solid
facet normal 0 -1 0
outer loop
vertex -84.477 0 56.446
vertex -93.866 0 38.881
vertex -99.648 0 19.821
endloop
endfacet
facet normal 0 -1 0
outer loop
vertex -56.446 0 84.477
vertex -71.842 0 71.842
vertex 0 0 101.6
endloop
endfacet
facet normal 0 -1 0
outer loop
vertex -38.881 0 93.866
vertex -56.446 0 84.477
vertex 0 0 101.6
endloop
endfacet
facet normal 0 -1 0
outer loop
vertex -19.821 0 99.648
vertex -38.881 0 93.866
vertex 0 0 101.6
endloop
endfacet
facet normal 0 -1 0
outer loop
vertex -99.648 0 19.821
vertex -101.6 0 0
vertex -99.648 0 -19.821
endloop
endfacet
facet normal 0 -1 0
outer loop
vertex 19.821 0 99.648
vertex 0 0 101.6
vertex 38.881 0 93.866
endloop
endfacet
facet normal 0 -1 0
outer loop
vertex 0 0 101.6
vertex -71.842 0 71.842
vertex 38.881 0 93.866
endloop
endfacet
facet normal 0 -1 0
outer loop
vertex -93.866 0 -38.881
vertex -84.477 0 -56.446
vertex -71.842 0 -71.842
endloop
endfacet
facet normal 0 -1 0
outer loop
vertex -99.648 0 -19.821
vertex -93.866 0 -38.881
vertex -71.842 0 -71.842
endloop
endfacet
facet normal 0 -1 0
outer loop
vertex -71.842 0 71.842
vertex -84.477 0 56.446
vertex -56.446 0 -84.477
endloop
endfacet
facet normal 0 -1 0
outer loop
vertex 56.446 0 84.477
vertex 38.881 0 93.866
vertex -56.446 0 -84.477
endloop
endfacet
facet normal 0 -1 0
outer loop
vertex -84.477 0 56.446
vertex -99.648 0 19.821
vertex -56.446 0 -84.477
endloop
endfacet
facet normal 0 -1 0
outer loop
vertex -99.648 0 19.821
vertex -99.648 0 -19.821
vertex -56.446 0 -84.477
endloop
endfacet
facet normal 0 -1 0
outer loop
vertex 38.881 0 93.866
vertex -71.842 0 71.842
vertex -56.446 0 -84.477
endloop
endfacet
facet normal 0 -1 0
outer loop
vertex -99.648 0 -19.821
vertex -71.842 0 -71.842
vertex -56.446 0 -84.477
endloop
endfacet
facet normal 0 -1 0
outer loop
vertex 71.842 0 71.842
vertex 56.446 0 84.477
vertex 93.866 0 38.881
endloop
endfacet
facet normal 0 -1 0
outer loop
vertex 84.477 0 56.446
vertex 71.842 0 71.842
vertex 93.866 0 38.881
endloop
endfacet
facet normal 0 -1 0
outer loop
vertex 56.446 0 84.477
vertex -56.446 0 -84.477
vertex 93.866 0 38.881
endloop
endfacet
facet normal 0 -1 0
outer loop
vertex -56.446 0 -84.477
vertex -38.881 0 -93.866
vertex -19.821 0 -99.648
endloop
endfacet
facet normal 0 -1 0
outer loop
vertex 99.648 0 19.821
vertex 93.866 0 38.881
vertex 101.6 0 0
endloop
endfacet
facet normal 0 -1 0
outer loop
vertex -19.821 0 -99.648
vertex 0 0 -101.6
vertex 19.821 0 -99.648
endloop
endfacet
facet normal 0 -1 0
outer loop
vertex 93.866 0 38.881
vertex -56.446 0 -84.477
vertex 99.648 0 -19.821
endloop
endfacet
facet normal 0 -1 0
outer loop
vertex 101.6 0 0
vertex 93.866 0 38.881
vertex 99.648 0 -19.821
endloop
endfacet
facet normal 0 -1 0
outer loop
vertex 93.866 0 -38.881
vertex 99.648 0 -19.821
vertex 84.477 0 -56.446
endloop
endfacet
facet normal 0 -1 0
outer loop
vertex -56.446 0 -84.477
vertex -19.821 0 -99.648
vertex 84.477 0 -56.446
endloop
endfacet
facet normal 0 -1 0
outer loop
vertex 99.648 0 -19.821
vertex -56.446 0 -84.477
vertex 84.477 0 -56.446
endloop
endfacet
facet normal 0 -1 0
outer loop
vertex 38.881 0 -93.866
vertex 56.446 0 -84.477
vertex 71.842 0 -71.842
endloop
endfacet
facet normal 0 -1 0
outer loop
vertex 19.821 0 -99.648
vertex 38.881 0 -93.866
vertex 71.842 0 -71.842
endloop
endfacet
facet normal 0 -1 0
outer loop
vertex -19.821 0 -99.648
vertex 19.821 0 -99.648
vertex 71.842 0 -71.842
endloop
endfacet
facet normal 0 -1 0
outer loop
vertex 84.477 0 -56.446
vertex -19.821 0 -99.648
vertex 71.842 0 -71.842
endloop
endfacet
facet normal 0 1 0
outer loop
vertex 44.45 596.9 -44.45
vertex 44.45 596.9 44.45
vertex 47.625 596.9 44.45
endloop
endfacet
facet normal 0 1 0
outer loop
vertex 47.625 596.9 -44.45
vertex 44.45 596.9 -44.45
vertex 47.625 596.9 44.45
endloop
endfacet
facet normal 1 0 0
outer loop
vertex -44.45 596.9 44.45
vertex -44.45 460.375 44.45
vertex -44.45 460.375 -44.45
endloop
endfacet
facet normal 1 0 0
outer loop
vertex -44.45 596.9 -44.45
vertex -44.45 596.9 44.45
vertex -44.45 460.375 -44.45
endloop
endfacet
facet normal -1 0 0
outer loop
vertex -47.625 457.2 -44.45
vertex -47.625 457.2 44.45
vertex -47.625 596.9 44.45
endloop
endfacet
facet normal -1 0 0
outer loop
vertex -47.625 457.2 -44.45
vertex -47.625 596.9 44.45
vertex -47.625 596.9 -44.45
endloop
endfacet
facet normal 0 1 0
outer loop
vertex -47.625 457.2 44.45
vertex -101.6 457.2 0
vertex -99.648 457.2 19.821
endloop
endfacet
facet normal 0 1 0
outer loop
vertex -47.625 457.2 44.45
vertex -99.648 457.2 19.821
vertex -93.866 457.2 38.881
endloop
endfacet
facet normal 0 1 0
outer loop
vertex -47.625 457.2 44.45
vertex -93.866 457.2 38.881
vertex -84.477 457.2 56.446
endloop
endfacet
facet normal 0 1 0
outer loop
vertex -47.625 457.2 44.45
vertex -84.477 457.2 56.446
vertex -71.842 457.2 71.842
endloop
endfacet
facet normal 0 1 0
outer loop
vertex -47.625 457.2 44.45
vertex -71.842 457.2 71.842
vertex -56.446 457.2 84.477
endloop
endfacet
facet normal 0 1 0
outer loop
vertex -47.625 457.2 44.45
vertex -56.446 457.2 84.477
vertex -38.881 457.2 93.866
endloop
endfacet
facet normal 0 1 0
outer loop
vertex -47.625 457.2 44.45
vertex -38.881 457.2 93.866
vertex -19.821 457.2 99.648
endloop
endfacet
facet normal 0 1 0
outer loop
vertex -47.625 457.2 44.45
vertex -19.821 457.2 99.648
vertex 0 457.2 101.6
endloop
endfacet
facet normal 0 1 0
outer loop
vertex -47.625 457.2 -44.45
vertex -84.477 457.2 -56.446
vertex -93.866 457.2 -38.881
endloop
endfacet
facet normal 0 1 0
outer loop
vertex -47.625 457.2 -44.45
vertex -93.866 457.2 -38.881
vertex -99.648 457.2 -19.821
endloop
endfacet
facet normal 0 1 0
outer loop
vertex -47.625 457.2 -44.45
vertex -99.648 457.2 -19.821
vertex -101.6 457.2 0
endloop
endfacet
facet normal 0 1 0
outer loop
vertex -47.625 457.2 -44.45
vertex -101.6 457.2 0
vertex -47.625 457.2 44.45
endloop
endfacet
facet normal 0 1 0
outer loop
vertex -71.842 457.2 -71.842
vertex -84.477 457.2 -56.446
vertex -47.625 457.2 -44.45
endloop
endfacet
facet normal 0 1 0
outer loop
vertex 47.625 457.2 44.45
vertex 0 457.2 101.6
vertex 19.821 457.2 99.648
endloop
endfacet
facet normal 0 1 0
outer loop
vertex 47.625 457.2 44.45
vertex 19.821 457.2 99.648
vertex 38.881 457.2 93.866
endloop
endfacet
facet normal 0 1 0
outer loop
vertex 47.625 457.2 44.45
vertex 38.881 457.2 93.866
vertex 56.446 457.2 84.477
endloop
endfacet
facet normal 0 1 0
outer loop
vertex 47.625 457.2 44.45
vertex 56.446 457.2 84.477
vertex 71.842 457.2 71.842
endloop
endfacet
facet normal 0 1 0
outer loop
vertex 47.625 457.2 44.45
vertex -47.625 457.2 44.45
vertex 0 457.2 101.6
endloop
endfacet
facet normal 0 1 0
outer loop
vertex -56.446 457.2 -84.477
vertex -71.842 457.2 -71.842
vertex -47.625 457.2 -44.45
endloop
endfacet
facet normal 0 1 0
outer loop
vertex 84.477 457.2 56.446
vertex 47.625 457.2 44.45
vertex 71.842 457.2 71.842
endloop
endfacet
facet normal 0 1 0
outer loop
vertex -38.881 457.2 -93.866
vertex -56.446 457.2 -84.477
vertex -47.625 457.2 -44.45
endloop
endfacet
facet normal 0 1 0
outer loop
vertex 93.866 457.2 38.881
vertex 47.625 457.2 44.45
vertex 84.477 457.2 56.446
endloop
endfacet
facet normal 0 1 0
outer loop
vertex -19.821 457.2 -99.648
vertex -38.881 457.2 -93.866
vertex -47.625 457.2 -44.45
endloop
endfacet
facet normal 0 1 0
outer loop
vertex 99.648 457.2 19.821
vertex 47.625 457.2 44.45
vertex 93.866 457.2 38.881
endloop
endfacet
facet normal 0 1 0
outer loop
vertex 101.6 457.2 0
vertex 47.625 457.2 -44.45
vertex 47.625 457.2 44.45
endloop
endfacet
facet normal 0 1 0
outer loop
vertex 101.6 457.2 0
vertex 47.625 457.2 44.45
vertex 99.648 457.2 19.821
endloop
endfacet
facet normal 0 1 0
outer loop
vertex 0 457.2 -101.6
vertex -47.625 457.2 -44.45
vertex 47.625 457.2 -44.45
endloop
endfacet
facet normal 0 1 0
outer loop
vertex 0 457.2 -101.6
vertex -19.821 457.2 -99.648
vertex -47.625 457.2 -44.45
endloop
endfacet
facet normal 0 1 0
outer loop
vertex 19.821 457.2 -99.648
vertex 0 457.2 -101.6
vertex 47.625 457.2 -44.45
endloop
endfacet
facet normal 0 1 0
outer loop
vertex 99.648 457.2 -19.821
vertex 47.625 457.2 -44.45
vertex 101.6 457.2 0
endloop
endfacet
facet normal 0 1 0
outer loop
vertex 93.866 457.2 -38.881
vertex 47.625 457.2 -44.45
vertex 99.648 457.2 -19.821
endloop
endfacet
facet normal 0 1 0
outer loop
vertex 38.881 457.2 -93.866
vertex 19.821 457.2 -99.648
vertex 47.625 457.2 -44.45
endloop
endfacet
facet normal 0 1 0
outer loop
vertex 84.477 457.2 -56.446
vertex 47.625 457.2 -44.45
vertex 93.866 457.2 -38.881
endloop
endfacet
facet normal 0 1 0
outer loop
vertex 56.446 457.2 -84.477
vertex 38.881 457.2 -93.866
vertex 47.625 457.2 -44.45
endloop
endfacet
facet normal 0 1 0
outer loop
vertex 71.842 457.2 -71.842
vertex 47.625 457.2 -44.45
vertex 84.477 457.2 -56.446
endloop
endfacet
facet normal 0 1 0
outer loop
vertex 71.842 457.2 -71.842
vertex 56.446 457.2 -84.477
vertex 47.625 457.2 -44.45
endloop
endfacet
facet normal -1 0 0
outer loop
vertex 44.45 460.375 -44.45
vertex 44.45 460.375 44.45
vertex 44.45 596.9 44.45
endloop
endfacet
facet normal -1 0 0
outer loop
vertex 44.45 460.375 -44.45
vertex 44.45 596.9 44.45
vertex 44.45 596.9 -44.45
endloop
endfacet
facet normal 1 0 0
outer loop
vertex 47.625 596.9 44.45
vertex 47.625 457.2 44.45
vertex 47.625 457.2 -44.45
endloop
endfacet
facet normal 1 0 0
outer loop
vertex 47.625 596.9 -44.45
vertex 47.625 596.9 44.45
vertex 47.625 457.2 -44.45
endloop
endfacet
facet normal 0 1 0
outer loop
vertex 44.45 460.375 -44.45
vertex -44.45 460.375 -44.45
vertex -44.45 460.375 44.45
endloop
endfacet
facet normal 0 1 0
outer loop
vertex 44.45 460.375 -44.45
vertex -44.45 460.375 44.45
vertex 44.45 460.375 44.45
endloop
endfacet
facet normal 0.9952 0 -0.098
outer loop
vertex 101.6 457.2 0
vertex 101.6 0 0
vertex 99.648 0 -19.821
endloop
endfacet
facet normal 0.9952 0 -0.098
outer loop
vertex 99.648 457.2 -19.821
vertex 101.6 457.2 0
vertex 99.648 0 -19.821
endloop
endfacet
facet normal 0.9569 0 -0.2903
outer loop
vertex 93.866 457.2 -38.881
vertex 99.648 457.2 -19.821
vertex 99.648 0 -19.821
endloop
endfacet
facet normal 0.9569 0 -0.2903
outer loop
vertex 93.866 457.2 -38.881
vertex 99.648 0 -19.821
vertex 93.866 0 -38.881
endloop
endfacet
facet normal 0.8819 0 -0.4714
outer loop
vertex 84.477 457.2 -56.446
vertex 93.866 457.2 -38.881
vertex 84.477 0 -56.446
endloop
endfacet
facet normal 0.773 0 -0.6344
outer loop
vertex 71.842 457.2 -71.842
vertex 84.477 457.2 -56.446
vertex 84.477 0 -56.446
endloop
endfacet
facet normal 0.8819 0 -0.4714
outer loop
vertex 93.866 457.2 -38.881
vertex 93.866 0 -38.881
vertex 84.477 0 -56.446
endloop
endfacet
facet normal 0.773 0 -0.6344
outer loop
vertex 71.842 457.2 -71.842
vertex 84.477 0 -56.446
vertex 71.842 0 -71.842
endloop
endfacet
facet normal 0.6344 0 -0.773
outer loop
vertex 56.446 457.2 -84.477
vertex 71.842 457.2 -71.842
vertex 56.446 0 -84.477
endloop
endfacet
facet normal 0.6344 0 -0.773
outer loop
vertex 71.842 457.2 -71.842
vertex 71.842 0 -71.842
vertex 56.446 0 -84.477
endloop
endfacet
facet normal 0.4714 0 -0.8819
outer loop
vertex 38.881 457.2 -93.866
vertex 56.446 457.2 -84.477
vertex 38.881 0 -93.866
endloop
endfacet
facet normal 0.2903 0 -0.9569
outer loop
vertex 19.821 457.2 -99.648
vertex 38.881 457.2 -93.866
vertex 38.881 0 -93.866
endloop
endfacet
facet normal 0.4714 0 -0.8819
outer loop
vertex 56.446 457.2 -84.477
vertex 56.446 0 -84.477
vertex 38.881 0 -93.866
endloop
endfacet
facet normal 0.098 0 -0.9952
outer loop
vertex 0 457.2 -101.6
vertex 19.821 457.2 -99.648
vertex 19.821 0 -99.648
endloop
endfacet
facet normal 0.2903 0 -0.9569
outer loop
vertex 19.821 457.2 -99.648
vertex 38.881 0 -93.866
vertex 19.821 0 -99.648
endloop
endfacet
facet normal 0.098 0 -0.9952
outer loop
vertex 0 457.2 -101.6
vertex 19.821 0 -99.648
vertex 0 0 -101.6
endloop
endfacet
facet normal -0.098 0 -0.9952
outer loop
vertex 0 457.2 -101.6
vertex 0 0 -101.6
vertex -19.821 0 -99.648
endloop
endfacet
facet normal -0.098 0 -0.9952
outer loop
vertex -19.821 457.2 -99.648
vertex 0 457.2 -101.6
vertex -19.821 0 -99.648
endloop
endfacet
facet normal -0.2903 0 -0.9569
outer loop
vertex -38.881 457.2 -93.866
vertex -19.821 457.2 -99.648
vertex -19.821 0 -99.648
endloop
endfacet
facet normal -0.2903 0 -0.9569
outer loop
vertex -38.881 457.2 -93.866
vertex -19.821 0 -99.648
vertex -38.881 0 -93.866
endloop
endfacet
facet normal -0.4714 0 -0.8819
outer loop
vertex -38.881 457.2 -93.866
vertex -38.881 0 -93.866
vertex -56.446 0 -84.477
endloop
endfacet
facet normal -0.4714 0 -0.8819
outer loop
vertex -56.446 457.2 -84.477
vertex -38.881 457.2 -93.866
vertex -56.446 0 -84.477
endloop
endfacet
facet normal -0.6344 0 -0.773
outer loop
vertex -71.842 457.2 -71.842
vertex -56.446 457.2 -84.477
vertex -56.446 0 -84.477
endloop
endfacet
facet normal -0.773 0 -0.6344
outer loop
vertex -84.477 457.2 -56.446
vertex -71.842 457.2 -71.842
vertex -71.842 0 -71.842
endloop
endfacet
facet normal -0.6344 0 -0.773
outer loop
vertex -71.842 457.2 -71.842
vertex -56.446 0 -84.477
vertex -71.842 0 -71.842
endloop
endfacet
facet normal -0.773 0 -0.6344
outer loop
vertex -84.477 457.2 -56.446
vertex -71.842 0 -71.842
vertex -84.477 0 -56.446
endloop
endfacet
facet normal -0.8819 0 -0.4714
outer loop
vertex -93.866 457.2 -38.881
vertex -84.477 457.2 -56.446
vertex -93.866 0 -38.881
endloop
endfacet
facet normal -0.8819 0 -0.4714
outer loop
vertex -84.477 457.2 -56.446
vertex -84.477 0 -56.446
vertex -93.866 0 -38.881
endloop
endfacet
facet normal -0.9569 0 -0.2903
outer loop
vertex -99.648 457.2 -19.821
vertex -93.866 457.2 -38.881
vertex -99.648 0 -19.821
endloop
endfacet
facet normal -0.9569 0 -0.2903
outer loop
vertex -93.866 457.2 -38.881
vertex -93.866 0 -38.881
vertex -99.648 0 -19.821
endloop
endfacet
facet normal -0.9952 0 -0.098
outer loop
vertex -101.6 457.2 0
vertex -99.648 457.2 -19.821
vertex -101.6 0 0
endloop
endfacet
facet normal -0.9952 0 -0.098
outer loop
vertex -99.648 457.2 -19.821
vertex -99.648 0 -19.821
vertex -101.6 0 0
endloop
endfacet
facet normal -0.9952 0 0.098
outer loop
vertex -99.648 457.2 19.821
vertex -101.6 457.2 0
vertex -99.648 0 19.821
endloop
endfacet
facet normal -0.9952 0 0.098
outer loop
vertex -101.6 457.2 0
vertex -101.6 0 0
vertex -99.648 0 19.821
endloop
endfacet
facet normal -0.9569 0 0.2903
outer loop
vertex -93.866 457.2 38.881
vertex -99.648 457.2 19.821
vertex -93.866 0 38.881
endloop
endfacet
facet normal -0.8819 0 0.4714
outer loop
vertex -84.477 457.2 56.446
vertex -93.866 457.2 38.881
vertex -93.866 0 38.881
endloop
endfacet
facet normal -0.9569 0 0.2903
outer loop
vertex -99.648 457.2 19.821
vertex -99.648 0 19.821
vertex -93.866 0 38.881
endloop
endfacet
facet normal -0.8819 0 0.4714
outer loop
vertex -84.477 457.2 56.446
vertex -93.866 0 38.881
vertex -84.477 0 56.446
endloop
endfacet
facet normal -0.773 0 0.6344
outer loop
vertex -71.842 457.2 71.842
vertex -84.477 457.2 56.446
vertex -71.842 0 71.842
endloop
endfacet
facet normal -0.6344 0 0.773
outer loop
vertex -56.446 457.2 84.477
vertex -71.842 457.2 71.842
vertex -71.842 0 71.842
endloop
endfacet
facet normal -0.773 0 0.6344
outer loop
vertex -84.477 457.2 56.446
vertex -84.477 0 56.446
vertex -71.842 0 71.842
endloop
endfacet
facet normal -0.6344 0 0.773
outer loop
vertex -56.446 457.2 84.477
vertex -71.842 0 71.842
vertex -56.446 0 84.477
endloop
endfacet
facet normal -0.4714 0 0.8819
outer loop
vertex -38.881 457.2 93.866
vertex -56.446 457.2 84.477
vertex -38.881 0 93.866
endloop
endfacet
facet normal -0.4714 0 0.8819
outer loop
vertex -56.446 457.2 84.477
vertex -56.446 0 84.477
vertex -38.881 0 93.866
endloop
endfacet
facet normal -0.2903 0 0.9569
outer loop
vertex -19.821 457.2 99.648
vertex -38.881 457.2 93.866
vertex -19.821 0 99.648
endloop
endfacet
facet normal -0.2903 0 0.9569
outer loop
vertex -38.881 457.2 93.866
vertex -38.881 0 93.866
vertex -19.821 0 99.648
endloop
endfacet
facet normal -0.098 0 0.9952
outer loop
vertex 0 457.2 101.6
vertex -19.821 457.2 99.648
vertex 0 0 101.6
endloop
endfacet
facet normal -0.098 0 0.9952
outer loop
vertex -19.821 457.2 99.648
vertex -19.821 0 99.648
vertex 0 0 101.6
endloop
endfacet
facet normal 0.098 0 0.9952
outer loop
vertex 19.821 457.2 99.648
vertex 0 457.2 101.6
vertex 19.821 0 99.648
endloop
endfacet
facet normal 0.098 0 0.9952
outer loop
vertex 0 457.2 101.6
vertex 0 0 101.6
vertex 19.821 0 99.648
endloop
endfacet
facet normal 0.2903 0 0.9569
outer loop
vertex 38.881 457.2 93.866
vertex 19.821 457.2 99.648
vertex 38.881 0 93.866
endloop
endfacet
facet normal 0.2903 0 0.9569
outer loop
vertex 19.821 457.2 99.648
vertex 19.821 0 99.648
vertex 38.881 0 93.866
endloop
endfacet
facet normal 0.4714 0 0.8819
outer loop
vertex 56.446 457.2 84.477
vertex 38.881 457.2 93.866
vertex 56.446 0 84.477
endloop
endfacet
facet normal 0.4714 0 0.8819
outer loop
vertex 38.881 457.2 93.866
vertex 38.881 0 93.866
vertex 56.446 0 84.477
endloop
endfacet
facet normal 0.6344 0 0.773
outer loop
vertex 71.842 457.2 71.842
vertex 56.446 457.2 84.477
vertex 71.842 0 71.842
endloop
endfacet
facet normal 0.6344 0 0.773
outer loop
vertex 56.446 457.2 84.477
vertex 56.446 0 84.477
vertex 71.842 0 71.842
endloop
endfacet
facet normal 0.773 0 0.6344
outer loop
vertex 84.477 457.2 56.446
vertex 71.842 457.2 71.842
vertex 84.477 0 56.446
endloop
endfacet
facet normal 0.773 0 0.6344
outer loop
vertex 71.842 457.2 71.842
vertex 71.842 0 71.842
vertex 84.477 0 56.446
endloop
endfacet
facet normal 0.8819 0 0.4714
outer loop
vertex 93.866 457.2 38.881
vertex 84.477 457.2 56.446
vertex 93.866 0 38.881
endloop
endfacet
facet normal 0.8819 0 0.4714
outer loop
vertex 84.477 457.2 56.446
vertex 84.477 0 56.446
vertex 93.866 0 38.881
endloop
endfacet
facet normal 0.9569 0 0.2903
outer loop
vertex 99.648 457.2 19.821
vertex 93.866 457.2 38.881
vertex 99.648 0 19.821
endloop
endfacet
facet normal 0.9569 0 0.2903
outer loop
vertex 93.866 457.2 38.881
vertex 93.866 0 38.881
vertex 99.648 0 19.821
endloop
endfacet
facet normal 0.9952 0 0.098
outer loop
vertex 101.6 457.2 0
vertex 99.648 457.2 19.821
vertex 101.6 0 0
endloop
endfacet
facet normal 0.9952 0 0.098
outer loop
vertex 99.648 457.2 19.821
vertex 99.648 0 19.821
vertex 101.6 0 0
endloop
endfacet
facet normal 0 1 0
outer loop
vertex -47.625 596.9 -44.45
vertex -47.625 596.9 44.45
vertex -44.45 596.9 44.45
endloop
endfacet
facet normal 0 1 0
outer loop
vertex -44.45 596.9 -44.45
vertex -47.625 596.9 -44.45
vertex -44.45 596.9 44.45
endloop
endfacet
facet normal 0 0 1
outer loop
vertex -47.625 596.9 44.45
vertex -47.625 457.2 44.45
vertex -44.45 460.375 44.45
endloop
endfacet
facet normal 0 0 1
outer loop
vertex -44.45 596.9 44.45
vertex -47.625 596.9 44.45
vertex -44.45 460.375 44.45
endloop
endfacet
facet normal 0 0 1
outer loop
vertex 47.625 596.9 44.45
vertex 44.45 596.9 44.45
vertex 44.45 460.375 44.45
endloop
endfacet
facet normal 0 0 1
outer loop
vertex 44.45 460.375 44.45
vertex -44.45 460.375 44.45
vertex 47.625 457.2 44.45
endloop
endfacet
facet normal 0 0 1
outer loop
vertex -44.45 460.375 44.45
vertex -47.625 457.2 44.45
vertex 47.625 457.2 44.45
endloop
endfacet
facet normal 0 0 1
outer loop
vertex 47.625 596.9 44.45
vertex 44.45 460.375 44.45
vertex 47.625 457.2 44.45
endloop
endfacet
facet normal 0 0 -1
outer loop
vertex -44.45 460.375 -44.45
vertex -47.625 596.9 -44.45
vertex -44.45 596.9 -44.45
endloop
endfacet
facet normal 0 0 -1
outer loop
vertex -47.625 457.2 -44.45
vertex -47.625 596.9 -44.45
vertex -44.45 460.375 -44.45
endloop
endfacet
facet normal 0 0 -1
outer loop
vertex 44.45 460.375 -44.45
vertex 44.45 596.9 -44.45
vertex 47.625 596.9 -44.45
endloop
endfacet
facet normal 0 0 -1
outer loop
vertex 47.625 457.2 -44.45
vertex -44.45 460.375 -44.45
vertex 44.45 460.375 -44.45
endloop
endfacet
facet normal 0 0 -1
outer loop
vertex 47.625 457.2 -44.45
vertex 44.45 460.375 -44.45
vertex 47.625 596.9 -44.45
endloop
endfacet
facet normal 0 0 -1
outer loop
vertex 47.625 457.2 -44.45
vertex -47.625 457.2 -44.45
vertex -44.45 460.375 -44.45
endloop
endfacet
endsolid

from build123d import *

# Parameters (mm, degrees)
SKETCH1_R           = 101.6
BOSS_EXTRUDE1_DEPTH = 457.2
SKETCH2_W           = 3.175
SKETCH2_H           = 88.9
BOSS_EXTRUDE3_DEPTH = 139.7
SKETCH2_3_W         = 88.9
SKETCH2_3_H         = 88.9
BOSS_EXTRUDE4_DEPTH = 3.175


with BuildPart() as part:
    # Sketch1 → Boss-Extrude1 (new body)
    with BuildSketch(Plane(origin=(0, 0, 0), x_dir=(1, 0, 0), z_dir=(0, 1, 0))):
        Circle(SKETCH1_R)
    extrude(amount=BOSS_EXTRUDE1_DEPTH)

    # Sketch2 → Boss-Extrude3 (add)
    with BuildSketch(Plane(origin=(0, 457.2, 0), x_dir=(1, 0, 0), z_dir=(0, 1, 0))):
        with Locations((46.0375, 0)):
            Rectangle(SKETCH2_W, SKETCH2_H)
        with Locations((-46.0375, 0)):
            Rectangle(SKETCH2_W, SKETCH2_H)
    extrude(amount=BOSS_EXTRUDE3_DEPTH)

    # Sketch2<3> → Boss-Extrude4 (add)
    with BuildSketch(Plane(origin=(0, 457.2, 0), x_dir=(1, 0, 0), z_dir=(0, 1, 0))):
        Rectangle(SKETCH2_3_W, SKETCH2_3_H)
    extrude(amount=BOSS_EXTRUDE4_DEPTH)


solid = part.part
